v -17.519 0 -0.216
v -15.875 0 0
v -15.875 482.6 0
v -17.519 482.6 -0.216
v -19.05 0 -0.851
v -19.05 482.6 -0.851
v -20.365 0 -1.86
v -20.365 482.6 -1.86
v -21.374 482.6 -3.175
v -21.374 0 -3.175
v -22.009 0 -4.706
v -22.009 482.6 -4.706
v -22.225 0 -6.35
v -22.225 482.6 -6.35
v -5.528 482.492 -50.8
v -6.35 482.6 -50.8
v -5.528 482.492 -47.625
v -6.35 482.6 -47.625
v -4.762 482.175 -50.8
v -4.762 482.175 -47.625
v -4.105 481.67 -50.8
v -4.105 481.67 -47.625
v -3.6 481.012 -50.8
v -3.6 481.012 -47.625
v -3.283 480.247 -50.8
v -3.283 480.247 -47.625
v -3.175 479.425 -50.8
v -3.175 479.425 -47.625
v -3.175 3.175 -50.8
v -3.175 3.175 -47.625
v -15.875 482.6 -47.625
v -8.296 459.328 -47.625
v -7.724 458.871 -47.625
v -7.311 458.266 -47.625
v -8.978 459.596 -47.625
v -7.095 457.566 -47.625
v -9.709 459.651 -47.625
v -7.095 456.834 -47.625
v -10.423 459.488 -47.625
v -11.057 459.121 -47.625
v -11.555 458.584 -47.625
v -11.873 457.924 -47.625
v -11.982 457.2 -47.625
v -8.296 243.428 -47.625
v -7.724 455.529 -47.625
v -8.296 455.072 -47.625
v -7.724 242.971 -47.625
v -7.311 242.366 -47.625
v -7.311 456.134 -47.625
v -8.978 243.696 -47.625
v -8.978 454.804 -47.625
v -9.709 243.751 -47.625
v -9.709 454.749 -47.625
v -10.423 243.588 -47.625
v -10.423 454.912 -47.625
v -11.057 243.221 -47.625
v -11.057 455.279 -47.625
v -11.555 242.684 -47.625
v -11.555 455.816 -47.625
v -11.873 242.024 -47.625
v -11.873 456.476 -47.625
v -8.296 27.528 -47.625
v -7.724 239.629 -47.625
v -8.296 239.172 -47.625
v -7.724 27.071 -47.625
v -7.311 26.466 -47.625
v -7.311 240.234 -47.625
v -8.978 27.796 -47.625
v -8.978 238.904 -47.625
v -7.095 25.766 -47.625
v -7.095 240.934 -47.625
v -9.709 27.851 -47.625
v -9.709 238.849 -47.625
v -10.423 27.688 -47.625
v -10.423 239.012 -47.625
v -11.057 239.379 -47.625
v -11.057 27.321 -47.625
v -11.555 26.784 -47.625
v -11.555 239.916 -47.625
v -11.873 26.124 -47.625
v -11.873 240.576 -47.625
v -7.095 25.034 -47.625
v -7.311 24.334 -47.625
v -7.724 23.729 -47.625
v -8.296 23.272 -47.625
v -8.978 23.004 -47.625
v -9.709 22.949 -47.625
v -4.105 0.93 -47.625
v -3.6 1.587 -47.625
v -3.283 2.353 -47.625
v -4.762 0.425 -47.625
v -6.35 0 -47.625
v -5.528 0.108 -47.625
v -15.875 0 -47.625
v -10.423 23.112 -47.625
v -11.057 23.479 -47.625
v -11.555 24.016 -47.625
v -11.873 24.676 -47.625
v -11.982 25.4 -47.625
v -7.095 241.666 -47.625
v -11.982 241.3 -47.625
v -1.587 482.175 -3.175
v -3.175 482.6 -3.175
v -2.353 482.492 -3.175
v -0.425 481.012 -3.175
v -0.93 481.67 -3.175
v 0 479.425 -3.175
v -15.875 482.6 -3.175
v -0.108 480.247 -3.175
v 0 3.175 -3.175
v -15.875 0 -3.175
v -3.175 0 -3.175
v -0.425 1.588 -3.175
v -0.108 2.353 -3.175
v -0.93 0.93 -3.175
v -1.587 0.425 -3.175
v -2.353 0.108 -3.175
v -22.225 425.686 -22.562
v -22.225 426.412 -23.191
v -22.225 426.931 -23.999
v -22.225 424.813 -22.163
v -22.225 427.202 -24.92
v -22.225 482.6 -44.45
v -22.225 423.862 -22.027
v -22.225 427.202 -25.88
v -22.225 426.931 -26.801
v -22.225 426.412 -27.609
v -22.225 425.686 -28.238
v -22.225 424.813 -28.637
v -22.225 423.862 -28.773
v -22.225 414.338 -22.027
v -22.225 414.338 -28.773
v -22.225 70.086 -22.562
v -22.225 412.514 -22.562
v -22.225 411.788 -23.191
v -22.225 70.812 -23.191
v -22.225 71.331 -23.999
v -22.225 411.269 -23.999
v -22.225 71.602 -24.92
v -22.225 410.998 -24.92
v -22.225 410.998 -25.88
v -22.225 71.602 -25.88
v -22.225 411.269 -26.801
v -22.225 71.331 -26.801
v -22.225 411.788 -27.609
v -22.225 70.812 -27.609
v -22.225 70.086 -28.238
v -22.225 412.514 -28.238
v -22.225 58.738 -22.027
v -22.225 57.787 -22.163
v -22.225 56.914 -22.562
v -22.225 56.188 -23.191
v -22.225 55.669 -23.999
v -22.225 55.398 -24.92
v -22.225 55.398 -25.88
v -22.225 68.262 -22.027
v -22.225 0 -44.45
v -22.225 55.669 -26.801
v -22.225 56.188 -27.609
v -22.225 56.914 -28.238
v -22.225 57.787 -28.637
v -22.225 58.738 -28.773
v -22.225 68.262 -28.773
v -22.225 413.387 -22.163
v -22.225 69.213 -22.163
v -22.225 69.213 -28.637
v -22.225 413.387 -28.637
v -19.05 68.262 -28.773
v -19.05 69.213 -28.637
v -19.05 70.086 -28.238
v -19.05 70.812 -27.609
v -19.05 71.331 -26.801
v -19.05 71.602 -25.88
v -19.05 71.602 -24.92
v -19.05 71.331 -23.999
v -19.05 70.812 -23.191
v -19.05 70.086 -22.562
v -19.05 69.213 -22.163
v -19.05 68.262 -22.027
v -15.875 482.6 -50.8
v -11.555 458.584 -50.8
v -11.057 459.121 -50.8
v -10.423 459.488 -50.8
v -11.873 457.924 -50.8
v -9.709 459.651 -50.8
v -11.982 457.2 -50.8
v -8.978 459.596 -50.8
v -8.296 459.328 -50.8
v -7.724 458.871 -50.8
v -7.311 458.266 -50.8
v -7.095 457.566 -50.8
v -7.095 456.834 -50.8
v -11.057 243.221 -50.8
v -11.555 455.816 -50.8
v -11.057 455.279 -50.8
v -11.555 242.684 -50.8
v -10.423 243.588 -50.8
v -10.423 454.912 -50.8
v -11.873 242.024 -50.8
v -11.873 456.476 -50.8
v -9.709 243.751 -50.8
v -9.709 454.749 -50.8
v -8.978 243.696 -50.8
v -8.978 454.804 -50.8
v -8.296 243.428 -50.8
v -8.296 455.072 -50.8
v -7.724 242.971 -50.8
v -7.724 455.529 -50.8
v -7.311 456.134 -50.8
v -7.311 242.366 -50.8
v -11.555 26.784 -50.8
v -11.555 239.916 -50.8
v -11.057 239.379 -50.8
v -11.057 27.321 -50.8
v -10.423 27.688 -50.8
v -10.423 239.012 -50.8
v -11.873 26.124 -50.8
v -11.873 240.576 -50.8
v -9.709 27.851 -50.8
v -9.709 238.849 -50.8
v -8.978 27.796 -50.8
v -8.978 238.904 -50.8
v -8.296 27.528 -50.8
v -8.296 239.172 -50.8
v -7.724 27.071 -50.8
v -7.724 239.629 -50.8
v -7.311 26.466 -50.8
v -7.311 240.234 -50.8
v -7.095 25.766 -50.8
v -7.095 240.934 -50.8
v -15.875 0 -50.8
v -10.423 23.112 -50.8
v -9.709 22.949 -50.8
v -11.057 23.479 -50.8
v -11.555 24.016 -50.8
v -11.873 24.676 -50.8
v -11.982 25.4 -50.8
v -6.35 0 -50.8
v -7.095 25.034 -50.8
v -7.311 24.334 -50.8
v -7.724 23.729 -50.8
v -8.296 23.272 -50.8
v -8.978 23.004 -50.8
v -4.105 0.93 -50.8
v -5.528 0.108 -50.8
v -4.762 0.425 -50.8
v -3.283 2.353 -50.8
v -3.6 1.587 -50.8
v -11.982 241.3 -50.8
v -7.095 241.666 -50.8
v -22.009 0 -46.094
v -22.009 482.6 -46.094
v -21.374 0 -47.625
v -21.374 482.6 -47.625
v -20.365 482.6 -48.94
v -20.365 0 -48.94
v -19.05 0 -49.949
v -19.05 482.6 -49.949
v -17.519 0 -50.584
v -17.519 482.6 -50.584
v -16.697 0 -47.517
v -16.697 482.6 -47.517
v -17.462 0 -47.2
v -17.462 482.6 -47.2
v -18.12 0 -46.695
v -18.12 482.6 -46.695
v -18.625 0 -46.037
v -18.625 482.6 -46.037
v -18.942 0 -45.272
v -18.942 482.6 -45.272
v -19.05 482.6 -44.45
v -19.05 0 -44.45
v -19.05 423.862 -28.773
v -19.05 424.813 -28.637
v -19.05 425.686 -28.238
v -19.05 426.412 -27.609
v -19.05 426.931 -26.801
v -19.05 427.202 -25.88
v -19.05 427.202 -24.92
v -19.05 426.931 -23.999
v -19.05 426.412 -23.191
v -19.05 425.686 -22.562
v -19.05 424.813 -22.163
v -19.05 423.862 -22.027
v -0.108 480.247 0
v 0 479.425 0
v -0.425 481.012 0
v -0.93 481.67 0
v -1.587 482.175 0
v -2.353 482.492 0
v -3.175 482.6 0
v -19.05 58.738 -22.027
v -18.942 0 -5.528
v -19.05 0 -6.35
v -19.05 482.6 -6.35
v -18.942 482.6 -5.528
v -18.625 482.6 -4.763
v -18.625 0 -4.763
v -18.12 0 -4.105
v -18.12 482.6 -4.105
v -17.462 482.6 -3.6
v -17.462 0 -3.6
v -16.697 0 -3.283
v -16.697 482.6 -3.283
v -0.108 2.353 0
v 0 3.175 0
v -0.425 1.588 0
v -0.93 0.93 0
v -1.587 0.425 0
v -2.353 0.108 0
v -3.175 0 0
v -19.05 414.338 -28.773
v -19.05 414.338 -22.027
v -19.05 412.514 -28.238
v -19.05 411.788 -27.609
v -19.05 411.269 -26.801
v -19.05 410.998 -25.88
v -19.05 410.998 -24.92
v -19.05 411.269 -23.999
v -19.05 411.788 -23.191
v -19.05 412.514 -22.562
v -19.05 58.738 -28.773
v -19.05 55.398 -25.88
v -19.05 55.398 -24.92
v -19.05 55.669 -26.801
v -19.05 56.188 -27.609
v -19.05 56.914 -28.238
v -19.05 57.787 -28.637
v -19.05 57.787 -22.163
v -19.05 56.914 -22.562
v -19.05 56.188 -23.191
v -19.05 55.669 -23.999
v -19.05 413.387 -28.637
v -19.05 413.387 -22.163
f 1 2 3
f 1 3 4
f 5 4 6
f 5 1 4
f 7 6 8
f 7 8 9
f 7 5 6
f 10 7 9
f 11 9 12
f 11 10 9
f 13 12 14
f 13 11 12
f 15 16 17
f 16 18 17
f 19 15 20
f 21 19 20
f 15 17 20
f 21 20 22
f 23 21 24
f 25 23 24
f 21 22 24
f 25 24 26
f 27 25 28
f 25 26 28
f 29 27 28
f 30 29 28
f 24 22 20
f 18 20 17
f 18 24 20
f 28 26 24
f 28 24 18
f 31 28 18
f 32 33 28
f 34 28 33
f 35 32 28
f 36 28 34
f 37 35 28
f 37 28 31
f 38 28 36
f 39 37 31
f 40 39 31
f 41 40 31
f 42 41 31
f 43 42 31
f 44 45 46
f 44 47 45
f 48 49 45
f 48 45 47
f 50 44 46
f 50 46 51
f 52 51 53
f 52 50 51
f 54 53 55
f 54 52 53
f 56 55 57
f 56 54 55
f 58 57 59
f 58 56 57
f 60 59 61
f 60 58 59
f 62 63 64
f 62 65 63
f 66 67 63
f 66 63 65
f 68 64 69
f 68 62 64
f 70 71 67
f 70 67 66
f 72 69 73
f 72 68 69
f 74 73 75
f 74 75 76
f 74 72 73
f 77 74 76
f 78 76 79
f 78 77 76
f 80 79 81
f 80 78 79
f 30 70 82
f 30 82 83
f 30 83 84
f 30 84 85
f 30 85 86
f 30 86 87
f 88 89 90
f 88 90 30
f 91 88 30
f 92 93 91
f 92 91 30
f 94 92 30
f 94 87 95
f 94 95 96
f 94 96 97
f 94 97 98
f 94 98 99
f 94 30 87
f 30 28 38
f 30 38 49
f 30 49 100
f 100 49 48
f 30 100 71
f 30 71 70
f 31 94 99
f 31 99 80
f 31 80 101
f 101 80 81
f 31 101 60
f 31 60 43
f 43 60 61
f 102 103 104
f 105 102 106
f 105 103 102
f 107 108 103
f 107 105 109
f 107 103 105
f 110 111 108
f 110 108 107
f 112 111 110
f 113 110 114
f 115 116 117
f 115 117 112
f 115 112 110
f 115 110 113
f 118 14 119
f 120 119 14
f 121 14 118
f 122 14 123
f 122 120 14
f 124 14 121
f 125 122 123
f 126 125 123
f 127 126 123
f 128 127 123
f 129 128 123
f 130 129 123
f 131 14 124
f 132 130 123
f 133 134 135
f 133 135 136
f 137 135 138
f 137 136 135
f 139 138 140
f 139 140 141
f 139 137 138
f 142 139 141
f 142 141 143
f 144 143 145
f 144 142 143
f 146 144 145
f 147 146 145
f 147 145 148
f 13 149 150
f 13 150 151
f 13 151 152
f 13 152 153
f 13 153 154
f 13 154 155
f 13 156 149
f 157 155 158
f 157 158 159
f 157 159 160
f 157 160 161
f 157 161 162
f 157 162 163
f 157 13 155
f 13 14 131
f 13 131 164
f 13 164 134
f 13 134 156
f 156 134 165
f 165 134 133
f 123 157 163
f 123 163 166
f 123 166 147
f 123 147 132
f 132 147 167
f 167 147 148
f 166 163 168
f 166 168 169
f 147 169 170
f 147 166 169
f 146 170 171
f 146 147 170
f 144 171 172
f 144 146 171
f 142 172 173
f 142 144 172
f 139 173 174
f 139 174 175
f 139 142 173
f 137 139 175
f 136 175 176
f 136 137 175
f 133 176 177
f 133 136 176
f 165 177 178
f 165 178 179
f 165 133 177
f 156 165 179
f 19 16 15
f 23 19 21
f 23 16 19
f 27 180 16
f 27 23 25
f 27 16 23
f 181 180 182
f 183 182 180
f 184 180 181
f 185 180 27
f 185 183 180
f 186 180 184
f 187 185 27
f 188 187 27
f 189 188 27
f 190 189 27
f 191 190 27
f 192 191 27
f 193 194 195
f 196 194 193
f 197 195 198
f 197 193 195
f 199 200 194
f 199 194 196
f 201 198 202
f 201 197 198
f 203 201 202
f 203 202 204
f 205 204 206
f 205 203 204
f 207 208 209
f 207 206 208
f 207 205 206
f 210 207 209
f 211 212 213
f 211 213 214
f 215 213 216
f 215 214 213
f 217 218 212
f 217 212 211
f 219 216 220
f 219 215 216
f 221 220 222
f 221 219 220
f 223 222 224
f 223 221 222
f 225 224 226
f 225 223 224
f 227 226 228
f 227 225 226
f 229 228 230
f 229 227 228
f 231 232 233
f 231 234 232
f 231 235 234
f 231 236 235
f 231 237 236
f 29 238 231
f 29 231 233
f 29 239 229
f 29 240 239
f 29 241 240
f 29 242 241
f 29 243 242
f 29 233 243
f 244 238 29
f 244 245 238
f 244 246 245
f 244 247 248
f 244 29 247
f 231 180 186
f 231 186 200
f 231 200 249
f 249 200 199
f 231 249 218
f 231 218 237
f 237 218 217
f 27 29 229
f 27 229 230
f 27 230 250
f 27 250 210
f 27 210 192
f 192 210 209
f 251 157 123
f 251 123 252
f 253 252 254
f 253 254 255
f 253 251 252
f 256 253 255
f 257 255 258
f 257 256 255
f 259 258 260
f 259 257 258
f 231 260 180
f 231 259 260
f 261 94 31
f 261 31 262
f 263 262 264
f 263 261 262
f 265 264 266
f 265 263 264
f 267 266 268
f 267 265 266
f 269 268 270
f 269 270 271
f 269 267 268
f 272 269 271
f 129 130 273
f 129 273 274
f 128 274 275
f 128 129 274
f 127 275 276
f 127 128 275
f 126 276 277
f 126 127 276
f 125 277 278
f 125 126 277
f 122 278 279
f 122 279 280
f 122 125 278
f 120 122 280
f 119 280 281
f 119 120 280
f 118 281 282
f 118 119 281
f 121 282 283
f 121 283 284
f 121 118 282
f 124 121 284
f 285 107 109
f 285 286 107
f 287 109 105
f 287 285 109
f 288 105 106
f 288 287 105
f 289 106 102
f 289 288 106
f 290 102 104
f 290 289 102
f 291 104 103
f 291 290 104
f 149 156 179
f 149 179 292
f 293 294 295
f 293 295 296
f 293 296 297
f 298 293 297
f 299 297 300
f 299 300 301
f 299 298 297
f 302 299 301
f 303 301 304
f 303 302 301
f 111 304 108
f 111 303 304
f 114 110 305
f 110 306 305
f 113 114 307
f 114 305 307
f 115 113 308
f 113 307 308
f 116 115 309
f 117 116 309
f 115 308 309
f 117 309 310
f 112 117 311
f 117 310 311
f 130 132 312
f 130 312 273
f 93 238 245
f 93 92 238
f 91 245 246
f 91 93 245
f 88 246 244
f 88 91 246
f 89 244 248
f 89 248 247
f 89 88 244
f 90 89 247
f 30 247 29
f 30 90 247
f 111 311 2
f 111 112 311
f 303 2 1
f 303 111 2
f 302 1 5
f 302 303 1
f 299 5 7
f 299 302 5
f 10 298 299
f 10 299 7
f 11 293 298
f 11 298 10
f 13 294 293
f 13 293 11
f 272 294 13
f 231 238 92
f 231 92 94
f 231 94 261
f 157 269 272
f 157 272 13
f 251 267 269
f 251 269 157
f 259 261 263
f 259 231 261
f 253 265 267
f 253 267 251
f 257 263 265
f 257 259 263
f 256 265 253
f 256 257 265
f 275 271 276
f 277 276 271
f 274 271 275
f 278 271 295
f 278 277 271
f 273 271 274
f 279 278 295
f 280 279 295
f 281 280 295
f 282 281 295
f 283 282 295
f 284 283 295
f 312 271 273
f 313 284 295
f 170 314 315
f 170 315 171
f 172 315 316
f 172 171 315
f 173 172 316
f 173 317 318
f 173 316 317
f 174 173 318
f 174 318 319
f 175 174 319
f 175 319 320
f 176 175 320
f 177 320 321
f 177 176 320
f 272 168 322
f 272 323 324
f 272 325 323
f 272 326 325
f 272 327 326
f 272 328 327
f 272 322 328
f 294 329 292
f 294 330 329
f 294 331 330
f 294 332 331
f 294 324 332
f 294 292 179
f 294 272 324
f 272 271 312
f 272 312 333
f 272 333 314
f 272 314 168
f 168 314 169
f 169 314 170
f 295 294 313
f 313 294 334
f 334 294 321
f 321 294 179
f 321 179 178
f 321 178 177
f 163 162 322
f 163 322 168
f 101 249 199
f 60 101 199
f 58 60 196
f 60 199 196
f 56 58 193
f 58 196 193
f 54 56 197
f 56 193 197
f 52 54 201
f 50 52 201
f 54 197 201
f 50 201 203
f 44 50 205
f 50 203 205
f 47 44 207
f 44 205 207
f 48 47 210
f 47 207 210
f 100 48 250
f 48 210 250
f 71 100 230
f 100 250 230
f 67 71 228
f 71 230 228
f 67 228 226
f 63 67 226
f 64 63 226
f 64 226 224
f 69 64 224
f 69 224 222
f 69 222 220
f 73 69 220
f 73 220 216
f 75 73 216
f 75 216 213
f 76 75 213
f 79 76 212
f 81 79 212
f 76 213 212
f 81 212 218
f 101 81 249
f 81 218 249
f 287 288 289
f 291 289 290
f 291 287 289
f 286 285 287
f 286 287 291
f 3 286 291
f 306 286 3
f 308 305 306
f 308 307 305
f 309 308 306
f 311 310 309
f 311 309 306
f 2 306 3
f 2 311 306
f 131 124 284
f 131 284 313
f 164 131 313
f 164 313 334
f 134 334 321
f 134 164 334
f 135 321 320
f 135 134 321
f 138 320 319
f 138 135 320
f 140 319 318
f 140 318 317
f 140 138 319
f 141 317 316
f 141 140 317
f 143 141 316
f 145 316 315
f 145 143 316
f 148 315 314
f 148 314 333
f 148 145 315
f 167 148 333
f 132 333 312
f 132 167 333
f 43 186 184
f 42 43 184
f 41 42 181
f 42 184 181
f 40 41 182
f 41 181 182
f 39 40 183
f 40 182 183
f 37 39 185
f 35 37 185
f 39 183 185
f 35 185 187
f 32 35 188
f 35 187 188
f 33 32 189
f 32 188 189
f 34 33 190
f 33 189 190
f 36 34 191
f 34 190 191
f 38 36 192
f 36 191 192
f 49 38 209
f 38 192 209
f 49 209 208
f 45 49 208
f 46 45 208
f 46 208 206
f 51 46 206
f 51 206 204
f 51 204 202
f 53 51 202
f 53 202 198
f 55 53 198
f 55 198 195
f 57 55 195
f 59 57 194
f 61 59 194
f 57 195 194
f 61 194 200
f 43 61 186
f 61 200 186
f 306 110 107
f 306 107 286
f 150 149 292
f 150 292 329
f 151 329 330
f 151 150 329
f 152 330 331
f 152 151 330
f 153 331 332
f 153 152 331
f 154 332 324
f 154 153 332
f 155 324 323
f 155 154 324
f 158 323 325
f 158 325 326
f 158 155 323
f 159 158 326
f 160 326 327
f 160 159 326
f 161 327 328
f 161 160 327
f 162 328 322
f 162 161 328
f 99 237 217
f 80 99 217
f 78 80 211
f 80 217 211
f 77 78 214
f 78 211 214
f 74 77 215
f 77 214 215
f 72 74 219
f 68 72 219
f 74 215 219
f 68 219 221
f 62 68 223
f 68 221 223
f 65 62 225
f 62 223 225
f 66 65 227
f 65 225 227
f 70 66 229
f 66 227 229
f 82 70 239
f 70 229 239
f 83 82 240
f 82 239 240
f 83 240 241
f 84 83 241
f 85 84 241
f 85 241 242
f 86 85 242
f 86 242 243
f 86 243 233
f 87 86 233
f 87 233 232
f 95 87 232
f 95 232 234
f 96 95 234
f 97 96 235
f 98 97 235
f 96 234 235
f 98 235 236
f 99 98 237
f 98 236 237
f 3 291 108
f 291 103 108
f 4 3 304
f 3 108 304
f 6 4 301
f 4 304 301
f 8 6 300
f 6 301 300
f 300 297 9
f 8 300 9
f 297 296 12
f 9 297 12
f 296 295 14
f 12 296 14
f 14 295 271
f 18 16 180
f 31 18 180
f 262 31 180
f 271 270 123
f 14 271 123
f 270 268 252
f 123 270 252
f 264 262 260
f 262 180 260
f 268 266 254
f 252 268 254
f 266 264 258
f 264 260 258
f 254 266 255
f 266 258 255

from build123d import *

# Parameters (mm, degrees)
BASE_FLANGE1_DEPTH = 482.6
SKETCH6_R          = 2.45745
CUT_EXTRUDE1_DEPTH = 3.175
FILLET1_R          = 3.175
CUT_EXTRUDE3_DEPTH = 3.175


# Sheet-metal steps are written as plain solids
with BuildPart() as part:
    # Sketch1 → Base-Flange1 (new body)
    with BuildSketch(Plane(origin=(0, 0, 0), x_dir=(1, 0, 0), z_dir=(0, 1, 0))):
        with BuildLine():
            Line((0, 0), (-15.875, 0))
            ThreePointArc((-15.875, 0), (-20.365128061, 1.859871939), (-22.225, 6.35))
            Line((-22.225, 6.35), (-22.225, 44.45))
            ThreePointArc((-22.225, 44.45), (-20.365128061, 48.940128061), (-15.875, 50.8))
            Line((-15.875, 50.8), (-3.175, 50.8))
            Line((-3.175, 50.8), (-3.175, 47.625))
            Line((-3.175, 47.625), (-15.875, 47.625))
            ThreePointArc((-15.875, 47.625), (-18.12006403, 46.69506403), (-19.05, 44.45))
            Line((-19.05, 44.45), (-19.05, 6.35))
            ThreePointArc((-19.05, 6.35), (-18.12006403, 4.10493597), (-15.875, 3.175))
            Line((-15.875, 3.175), (0, 3.175))
            Line((0, 3.175), (0, 0))
        make_face()
    extrude(amount=BASE_FLANGE1_DEPTH)

    # Sketch6 → Cut-Extrude1 (cut)
    with BuildSketch(Plane(origin=(0, 0, -50.8), x_dir=(-1, 0, 0), z_dir=(0, 0, -1))):
        with Locations((9.525, 457.2)):
            Circle(SKETCH6_R)
        with Locations((9.525, 25.4)):
            Circle(SKETCH6_R)
        with Locations((9.525, 241.3)):
            Circle(SKETCH6_R)
    extrude(amount=-CUT_EXTRUDE1_DEPTH, mode=Mode.SUBTRACT)

    # Fillet1
    fillet1_edges = [part.edges().sort_by_distance(p)[0] for p in [
        (-3.175, 0, -49.2125),
        (0, 0, -1.5875),
        (-3.175, 482.6, -49.2125),
        (0, 482.6, -1.5875),
    ]]
    fillet(fillet1_edges, radius=FILLET1_R)

    # Sketch8 → Cut-Extrude3 (cut)
    with BuildSketch(Plane.ZY.offset(22.225)):
        with BuildLine():
            Line((-22.0265625, 423.8625), (-22.0265625, 414.3375))
            ThreePointArc((-22.0265625, 414.3375), (-25.4, 410.9640625), (-28.7734375, 414.3375))
            Line((-28.7734375, 414.3375), (-28.7734375, 423.8625))
            ThreePointArc((-28.7734375, 423.8625), (-25.4, 427.2359375), (-22.0265625, 423.8625))
        make_face()
        with BuildLine():
            Line((-28.7734375, 58.7375), (-28.7734375, 68.2625))
            ThreePointArc((-28.7734375, 68.2625), (-25.4, 71.6359375), (-22.0265625, 68.2625))
            Line((-22.0265625, 68.2625), (-22.0265625, 58.7375))
            ThreePointArc((-22.0265625, 58.7375), (-25.4, 55.3640625), (-28.7734375, 58.7375))
        make_face()
    extrude(amount=-CUT_EXTRUDE3_DEPTH, mode=Mode.SUBTRACT)


solid = part.part
